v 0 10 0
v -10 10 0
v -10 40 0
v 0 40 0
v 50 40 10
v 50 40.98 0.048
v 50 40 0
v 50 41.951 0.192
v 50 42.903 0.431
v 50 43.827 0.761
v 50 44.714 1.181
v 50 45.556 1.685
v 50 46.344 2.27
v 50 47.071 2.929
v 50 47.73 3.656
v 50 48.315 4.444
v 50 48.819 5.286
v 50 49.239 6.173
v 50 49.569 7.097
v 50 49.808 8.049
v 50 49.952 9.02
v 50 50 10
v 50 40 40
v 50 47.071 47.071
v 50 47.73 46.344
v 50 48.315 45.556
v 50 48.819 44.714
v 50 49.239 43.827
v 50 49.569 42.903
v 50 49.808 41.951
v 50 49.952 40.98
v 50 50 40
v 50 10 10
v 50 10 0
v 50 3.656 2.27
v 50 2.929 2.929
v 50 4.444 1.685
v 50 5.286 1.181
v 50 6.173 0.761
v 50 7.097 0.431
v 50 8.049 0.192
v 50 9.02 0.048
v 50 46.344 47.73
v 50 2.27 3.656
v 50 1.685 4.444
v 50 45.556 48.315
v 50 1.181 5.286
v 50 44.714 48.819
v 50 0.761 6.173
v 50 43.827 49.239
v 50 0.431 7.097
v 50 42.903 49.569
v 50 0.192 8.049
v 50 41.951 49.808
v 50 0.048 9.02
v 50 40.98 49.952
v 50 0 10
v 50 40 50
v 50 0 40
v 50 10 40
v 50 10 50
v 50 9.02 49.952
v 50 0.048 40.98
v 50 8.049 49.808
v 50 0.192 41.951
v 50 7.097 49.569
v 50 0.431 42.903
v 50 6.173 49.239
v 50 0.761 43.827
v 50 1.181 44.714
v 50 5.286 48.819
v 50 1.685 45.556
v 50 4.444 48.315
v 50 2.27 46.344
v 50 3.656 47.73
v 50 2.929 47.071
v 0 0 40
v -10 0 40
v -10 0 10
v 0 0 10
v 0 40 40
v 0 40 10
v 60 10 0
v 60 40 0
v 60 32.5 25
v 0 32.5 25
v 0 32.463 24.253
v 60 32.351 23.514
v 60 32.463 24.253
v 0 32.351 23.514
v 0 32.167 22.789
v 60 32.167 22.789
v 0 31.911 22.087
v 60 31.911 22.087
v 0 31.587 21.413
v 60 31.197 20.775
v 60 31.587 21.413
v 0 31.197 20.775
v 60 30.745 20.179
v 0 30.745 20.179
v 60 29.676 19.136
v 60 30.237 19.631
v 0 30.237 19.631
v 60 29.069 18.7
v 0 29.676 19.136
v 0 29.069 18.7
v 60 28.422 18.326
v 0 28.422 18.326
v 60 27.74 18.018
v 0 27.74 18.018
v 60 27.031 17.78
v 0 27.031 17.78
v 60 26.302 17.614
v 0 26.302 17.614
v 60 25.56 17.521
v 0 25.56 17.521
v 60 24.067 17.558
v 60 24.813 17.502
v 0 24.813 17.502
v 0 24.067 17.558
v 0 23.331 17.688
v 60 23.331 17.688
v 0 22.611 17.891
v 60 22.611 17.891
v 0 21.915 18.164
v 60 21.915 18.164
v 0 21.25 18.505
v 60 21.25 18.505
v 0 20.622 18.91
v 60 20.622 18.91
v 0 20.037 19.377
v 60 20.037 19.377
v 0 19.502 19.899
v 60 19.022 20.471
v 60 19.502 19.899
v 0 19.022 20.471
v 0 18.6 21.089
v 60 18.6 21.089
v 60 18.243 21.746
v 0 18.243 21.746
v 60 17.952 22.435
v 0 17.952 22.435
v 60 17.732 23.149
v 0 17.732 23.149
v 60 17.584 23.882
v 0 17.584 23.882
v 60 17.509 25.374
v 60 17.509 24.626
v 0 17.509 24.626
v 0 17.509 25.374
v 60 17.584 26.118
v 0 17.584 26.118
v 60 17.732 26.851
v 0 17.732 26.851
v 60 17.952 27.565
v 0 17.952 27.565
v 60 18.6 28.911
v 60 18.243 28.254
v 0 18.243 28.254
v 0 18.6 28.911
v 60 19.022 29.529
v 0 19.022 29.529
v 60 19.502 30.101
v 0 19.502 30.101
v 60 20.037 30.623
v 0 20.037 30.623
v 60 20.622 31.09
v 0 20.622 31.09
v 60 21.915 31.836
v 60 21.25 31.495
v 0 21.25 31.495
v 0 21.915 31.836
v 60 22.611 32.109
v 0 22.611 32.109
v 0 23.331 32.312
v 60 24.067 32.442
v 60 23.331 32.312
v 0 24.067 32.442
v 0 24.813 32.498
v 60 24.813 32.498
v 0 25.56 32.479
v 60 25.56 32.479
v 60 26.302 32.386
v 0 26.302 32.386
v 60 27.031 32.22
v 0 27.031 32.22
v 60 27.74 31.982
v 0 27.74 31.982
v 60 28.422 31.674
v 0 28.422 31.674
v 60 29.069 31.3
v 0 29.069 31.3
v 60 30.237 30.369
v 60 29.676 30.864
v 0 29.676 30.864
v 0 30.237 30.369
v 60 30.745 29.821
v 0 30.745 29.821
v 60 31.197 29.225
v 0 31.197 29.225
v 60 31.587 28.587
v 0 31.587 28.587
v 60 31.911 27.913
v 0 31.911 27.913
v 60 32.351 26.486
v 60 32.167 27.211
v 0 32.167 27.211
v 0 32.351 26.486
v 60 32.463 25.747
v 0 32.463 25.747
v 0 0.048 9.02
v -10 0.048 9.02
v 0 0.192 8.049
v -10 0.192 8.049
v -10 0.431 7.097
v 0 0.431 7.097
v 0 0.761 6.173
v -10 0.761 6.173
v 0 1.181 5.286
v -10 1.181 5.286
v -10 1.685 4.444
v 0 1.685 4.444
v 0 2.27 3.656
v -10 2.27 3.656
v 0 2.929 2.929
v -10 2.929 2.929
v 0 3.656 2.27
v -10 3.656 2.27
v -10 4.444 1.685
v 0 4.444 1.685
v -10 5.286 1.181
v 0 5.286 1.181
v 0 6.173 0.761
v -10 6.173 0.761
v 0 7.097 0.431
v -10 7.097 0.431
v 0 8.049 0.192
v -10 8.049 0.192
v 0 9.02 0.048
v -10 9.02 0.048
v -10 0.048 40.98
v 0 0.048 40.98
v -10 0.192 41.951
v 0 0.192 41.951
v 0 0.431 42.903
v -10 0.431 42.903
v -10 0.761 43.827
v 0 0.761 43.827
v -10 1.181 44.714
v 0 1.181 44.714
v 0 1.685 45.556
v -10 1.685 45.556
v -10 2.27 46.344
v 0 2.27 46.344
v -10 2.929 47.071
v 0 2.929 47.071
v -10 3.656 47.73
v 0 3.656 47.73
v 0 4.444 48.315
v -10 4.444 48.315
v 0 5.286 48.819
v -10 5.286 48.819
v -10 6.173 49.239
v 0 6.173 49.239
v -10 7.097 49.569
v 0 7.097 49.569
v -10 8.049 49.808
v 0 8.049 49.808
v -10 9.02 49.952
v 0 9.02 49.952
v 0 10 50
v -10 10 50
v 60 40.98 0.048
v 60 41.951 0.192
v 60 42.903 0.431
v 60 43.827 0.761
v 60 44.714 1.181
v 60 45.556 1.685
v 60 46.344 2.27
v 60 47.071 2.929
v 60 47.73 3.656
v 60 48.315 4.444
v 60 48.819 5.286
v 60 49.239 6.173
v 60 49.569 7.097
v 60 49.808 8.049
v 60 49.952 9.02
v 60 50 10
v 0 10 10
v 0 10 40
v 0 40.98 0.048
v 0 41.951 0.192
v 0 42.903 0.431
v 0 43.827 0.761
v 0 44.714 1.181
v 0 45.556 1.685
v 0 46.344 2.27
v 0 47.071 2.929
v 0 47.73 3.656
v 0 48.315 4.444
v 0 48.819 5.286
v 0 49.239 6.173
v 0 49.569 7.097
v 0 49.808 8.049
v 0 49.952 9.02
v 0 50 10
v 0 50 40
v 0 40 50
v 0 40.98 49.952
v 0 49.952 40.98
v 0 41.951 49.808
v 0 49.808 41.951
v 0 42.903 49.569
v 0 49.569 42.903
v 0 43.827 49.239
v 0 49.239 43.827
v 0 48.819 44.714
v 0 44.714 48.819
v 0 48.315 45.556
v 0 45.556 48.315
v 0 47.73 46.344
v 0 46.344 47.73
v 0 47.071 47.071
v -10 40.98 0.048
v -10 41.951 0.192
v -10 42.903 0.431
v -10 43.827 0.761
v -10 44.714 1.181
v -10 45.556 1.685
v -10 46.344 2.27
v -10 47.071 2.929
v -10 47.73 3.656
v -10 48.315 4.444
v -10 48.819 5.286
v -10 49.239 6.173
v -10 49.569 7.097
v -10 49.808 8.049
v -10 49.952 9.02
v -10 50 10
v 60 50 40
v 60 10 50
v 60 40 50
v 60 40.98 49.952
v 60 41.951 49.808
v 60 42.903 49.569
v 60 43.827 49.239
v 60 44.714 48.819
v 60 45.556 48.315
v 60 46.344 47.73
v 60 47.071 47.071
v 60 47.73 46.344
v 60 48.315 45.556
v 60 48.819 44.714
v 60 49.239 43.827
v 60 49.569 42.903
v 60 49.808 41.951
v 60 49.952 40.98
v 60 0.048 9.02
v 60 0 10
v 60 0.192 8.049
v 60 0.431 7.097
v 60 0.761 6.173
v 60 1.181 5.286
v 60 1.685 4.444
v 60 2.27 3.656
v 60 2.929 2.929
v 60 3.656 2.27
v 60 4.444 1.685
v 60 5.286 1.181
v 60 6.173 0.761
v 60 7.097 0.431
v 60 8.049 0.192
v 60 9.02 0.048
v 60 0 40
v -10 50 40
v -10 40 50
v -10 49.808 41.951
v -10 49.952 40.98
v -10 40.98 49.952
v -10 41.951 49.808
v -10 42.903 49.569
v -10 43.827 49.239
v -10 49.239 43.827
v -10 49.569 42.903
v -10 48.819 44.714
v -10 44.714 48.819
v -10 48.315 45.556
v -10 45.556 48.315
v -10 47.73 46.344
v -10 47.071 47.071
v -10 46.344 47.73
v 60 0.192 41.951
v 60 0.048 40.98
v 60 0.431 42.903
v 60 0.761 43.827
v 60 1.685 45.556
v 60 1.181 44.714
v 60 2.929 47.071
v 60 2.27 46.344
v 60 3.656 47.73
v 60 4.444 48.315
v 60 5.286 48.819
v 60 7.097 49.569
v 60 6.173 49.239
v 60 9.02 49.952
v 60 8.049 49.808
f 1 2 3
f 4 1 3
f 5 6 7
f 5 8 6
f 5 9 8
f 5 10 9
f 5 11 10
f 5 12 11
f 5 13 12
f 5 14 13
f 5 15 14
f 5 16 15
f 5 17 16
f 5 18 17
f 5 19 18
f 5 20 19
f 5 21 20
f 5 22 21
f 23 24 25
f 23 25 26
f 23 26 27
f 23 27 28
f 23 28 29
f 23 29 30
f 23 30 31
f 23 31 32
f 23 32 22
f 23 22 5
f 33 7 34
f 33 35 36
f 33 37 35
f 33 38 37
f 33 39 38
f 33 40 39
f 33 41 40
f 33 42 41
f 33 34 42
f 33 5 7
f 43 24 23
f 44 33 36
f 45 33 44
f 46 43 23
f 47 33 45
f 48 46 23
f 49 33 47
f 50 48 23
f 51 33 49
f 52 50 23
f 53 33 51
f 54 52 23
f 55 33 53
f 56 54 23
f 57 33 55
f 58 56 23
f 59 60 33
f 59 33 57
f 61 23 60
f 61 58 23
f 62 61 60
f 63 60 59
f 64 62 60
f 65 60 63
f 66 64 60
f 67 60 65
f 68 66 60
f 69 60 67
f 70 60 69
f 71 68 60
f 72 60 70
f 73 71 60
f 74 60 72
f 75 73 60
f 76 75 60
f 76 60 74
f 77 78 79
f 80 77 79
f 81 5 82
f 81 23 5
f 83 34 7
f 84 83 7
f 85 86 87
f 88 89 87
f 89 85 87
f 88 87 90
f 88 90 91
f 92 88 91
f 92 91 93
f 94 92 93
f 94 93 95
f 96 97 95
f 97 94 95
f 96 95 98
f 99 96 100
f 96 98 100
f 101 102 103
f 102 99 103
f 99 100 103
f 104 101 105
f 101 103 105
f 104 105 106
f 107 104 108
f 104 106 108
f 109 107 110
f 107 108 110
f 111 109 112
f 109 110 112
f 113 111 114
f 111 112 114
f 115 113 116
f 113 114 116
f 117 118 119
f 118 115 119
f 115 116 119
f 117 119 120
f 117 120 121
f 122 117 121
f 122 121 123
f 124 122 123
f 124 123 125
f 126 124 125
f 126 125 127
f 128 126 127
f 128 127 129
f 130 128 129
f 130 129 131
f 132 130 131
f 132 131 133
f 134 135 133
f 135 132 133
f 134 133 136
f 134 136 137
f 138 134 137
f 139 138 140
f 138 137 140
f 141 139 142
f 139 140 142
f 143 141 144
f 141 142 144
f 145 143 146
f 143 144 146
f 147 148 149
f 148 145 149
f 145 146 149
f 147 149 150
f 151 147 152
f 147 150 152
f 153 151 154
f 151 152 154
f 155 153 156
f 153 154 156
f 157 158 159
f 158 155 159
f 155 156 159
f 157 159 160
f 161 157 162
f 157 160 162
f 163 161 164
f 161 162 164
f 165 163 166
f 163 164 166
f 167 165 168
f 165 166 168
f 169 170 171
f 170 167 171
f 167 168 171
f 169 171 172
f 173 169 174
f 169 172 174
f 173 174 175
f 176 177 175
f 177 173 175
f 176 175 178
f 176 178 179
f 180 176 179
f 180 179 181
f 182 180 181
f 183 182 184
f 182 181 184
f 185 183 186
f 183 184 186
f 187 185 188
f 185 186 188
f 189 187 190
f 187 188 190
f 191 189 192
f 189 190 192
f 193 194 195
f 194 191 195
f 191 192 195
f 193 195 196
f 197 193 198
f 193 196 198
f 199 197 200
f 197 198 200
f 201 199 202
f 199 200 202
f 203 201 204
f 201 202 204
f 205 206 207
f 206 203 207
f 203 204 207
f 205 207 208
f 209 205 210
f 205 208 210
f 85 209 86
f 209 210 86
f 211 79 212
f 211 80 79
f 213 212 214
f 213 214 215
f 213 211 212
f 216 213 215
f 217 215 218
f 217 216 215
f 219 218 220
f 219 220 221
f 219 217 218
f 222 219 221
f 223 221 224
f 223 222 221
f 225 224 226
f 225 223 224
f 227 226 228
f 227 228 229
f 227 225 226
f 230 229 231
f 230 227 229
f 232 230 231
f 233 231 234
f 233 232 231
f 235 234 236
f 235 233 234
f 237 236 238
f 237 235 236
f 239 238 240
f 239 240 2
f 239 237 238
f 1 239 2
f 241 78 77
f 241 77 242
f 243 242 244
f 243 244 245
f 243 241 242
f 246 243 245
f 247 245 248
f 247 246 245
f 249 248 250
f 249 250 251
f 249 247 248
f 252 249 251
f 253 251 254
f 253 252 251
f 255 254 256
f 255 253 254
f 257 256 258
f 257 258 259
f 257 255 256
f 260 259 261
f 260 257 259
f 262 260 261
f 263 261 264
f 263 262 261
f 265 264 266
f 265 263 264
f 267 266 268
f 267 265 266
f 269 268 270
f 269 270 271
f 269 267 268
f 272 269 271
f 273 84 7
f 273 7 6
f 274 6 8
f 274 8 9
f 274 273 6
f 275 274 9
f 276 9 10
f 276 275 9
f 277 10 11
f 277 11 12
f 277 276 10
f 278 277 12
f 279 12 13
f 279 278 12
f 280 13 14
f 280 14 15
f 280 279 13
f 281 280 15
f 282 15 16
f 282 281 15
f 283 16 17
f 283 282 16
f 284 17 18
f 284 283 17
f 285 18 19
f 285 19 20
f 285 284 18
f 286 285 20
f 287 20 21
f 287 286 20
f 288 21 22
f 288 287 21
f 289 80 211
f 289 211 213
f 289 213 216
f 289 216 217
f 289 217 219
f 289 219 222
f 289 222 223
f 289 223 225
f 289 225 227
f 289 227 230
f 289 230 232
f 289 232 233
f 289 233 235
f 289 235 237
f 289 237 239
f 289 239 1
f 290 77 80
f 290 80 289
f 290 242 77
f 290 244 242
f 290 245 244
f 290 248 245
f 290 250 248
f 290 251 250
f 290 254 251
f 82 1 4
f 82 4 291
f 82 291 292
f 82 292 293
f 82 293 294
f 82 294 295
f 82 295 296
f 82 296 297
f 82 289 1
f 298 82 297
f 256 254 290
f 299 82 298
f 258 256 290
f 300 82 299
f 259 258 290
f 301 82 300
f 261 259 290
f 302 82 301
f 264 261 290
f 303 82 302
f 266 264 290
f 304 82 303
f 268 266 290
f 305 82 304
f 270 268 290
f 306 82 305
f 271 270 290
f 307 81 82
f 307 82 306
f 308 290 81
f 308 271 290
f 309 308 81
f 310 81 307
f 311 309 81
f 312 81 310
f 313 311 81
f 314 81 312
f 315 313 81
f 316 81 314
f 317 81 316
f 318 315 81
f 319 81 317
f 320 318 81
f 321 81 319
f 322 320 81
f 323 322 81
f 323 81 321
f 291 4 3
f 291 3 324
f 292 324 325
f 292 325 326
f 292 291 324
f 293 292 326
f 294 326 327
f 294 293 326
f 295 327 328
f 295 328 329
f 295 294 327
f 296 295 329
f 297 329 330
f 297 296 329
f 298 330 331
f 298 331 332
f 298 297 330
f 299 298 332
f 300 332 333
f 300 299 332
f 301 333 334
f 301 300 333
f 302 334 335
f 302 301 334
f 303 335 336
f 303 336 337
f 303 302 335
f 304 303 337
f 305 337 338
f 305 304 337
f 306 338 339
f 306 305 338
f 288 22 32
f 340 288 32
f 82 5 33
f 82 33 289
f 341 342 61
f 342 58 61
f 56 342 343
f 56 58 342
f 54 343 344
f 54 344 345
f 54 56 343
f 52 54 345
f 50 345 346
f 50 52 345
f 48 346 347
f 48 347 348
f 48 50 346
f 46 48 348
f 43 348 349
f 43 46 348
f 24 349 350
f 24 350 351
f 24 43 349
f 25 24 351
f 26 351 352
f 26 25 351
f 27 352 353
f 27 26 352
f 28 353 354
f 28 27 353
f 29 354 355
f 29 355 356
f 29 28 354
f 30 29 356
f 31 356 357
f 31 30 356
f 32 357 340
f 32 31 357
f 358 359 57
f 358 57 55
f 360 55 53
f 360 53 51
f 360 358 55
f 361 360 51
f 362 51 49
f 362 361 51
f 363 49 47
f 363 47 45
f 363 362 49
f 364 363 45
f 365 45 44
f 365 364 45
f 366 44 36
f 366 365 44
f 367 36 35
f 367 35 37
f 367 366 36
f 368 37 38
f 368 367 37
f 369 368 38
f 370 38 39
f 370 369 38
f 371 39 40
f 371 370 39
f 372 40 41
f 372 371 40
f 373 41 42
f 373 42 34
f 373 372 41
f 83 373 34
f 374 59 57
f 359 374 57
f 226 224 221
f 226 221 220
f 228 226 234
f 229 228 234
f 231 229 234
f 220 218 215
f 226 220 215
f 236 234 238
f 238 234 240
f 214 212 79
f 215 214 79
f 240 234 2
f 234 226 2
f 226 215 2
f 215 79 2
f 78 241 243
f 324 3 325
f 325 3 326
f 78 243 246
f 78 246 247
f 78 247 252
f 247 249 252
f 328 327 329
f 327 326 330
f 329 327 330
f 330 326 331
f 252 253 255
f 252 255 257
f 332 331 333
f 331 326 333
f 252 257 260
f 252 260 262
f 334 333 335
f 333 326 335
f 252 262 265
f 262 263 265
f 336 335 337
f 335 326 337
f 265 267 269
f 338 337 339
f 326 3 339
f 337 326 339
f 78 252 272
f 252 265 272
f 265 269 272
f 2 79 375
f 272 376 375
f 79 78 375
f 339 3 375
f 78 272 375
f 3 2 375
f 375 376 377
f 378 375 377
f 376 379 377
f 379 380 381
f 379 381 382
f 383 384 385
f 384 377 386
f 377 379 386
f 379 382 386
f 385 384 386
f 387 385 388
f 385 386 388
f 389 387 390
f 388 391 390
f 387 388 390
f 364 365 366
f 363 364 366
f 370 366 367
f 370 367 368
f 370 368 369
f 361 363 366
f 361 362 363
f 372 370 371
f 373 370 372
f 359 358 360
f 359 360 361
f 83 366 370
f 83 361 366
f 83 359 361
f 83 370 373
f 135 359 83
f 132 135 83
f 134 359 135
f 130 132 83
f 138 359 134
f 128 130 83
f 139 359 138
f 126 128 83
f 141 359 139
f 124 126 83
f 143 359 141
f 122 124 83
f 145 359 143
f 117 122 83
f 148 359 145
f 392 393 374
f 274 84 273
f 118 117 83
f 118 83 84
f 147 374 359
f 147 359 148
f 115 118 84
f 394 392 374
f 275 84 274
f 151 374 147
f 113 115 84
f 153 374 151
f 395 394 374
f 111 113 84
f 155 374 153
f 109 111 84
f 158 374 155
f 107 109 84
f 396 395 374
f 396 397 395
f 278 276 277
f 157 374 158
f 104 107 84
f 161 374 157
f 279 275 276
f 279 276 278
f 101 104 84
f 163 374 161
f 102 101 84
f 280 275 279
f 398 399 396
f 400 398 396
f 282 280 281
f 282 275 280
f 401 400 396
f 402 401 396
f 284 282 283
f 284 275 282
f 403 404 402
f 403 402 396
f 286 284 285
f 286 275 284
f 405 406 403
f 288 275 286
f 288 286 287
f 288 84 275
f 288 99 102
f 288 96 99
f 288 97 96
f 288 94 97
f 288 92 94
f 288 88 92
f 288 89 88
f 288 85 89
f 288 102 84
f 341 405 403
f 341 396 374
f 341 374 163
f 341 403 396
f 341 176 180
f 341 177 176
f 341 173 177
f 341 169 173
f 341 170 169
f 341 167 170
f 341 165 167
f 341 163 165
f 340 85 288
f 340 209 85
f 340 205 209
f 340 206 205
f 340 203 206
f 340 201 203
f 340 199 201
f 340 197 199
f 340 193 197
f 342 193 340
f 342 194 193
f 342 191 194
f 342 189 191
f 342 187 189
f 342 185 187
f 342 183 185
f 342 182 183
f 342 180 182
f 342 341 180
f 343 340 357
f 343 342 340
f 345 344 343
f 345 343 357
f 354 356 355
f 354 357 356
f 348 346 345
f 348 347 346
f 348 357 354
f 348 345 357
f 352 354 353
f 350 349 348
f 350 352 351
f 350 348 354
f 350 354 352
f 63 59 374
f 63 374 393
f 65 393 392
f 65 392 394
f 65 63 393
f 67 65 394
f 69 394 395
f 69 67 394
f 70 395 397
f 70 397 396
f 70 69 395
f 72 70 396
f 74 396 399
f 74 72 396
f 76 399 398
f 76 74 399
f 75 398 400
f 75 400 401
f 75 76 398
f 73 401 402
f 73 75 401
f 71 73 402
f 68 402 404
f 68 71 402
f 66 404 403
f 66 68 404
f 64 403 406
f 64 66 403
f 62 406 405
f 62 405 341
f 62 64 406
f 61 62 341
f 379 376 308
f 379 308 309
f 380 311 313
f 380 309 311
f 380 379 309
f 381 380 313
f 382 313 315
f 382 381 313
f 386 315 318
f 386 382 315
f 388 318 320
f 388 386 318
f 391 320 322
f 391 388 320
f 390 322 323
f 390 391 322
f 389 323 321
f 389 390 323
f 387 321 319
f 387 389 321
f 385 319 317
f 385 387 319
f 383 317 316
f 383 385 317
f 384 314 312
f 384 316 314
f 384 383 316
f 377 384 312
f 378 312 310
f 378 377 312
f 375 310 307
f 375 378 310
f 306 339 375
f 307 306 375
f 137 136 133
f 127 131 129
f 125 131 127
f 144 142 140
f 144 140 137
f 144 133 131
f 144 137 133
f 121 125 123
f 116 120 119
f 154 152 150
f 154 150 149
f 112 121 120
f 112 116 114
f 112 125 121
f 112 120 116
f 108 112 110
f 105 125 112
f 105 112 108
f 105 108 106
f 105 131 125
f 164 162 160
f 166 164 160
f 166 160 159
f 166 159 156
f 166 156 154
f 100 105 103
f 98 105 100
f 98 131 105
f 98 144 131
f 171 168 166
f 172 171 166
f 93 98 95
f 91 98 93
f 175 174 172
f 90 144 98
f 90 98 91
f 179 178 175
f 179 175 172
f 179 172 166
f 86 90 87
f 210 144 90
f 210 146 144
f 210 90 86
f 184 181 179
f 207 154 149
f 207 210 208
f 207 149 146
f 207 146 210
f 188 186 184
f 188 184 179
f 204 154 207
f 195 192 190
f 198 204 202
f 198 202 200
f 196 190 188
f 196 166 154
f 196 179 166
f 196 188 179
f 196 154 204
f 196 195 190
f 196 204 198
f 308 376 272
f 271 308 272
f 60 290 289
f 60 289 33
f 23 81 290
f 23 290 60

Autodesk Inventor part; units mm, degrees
ref_plane "YZ Plane" through (0, 0, 0) normal (1, 0, 0) x (0, 1, 0)
ref_plane "XZ Plane" through (0, 0, 0) normal (0, 1, 0) x (-1, 0, 0)
ref_plane "XY Plane" through (0, 0, 0) normal (0, 0, 1) x (1, 0, 0)
sketch "Sketch1" plane through (0, 0, 0) normal (1, 0, 0) x (0, 1, 0)
  line L0 (0, 0) -> (50, 0)
  line L1 (50, 0) -> (50, 50)
  line L2 (50, 50) -> (0, 50)
  line L3 (0, 50) -> (0, 0)
  circle A0 centre (25, 25) radius 7.5
  dimension "d0" = 50
  dimension "d1" = 50
  dimension "d2" = 15
extrude "Extrusion1" add sketch "Sketch1" along normal blind 60
extrude "Extrusion7" add sketch "Sketch1" against normal blind 10 contours L3 L2 L1 L0 | A0
sketch "Sketch6" plane through (60, 0, 50) normal (0, 0, 1) x (1, 0, 0)
  line L0 (0, 50) -> (-70, 50) projected
  line L1 (-70, 0) -> (0, 0) projected
  line L2 (-60, 50) -> (-10, 50)
  line L3 (-10, 50) -> (-10, 0)
  line L4 (-10, 0) -> (-60, 0)
  line L5 (-60, 0) -> (-60, 50)
  line L6 (-60, 50) -> (-10, 50)
  line L7 (-10, 50) -> (-10, 40)
  line L8 (-10, 40) -> (-60, 40)
  line L9 (-60, 40) -> (-60, 50)
  line L10 (-10, 0) -> (-60, 0)
  line L11 (-60, 0) -> (-60, 10)
  line L12 (-60, 10) -> (-10, 10)
  line L13 (-10, 10) -> (-10, 0)
  line L14 (-60, 50) -> (-10, 50)
  line L15 (-10, 50) -> (-10, 0)
  line L16 (-10, 0) -> (-60, 0)
  line L17 (-60, 0) -> (-60, 50)
  point P0 (-10, 10)
  dimension "d33" = 50
  dimension "d34" = 10
  dimension "d35" = 10
extrude "Extrusion8" cut sketch "Sketch6" against normal blind 100 contours L3 L8 L5 L0 | L3 L1 L5 L12
extrude "Extrusion9" cut sketch "Sketch6" against normal blind 10 contours L3 L12 L5 L8
sketch "Sketch7" plane through (60, 0, 0) normal (0, 0, -1) x (-1, 0, 0)
  line L0 (60, 10) -> (60, 40) projected
  line L1 (10, 0) -> (10, 10) projected
  line L2 (60, 40) -> (10, 40)
  line L3 (10, 40) -> (10, 10)
  line L4 (10, 10) -> (60, 10)
  line L5 (60, 10) -> (60, 40)
  point P0 (60, 0)
extrude "Extrusion10" cut sketch "Sketch7" against normal blind 10
fillet "Fillet4" radius 10 8 edges at (55, 50, 50) (-5, 50, 50) (-5, 50, 0) (55, 0, 50) (55, 50, 0) (-5, 0, 50) (55, 0, 0) (-5, 0, 0)
sketch "Sketch8" plane through (60, 0, 0) normal (1, 0, 0) x (0, 0, -1)
  point P0 (0, 0)
properties part number "Contenedor"
